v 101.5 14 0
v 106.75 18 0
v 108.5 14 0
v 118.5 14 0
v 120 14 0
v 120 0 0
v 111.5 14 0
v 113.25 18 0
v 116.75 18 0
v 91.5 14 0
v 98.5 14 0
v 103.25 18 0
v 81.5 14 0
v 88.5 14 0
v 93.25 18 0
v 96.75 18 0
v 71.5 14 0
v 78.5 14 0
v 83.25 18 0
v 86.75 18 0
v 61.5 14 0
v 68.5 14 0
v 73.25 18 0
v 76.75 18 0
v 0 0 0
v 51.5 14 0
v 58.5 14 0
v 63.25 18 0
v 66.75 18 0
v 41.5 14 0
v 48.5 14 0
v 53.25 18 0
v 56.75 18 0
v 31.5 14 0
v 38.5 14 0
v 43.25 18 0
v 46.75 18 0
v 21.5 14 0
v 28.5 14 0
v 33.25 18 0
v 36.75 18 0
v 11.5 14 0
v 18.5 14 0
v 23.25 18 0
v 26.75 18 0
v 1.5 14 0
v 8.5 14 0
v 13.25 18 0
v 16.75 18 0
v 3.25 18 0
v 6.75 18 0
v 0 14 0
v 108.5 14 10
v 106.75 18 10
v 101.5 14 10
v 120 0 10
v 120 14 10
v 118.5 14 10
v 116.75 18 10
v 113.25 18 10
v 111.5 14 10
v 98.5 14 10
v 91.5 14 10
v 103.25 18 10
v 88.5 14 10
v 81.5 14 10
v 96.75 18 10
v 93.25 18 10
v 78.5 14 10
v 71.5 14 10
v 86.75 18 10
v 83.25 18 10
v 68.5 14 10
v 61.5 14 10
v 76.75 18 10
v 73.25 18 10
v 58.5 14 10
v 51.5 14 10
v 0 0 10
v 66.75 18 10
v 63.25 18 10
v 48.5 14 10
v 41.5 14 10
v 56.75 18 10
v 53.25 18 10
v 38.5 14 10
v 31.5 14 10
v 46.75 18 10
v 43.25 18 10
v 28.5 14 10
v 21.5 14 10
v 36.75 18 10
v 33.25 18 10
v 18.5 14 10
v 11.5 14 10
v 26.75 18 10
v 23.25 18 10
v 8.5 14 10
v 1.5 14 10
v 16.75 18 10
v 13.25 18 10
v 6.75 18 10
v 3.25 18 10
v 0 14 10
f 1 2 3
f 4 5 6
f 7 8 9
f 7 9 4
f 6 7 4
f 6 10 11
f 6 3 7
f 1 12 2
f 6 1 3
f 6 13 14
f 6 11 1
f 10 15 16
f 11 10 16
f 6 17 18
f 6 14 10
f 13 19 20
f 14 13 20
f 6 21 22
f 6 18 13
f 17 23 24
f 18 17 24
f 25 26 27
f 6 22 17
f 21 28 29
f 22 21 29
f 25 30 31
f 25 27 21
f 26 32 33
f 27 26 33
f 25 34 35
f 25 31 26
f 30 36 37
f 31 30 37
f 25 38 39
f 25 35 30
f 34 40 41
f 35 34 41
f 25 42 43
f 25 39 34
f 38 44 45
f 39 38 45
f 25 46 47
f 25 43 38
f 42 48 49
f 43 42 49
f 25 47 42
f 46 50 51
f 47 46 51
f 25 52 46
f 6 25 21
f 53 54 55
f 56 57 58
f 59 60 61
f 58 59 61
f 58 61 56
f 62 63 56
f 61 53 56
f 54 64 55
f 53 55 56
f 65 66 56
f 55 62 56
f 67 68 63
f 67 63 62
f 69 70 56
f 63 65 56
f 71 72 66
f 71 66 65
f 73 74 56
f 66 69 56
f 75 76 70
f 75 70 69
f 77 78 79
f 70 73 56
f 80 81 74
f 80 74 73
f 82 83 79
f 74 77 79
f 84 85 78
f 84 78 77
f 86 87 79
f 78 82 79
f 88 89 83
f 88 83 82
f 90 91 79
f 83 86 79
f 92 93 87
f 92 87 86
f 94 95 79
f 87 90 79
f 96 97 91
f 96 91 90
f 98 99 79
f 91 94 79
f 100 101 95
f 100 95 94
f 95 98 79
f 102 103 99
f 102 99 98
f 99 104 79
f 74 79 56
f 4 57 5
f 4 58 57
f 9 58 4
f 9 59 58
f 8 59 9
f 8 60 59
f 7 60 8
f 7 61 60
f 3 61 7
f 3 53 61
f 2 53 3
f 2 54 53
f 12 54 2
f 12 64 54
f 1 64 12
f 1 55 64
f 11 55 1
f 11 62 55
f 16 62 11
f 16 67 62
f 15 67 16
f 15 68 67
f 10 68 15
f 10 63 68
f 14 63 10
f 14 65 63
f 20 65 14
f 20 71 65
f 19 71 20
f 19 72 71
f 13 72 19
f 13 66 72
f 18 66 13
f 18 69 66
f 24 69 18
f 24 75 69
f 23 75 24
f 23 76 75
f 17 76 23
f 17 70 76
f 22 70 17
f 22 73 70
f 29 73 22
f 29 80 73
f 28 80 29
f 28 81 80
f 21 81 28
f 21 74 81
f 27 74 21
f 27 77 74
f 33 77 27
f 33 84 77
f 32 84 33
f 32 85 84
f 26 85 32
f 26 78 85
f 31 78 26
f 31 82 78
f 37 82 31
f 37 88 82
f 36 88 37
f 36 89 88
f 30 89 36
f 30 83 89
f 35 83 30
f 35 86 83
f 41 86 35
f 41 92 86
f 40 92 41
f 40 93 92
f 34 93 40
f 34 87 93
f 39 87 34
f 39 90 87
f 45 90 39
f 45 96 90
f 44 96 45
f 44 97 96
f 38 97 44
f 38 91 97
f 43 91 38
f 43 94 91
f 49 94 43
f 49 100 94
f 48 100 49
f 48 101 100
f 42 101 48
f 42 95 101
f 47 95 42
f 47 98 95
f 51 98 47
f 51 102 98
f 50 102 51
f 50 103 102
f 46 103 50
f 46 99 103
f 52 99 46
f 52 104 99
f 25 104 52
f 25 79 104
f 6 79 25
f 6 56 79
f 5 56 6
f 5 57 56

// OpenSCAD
$fn = 32;

// ----------------------------------------------------------------------
// Gear rack: 12 teeth, pitch 10 mm
// ----------------------------------------------------------------------

// --- parameters (mm) ---
teeth = 12;               // number of teeth
pitch = 10;               // tooth pitch, X
root_w = 7;               // tooth width at the root
tip_w = 3.5;              // tooth width at the tip
base_h = 14;              // rack body height, Y
tooth_h = 4;              // tooth height above the body
plate_t = 10;             // rack width, Z (extrusion height)

rack_l = teeth * pitch;  // overall length
total_h = base_h + tooth_h;  // overall height

profile = [[0, 0], [120, 0], [120, 14], [118.5, 14], [116.75, 18], [113.25, 18], [111.5, 14], [108.5, 14], [106.75, 18], [103.25, 18], [101.5, 14], [98.5, 14], [96.75, 18], [93.25, 18], [91.5, 14], [88.5, 14], [86.75, 18], [83.25, 18], [81.5, 14], [78.5, 14], [76.75, 18], [73.25, 18], [71.5, 14], [68.5, 14], [66.75, 18], [63.25, 18], [61.5, 14], [58.5, 14], [56.75, 18], [53.25, 18], [51.5, 14], [48.5, 14], [46.75, 18], [43.25, 18], [41.5, 14], [38.5, 14], [36.75, 18], [33.25, 18], [31.5, 14], [28.5, 14], [26.75, 18], [23.25, 18], [21.5, 14], [18.5, 14], [16.75, 18], [13.25, 18], [11.5, 14], [8.5, 14], [6.75, 18], [3.25, 18], [1.5, 14], [0, 14]];  // primary outline, 52 points, counter clockwise

// --- the one profile operation ---
linear_extrude(height = plate_t) polygon(points = profile);
